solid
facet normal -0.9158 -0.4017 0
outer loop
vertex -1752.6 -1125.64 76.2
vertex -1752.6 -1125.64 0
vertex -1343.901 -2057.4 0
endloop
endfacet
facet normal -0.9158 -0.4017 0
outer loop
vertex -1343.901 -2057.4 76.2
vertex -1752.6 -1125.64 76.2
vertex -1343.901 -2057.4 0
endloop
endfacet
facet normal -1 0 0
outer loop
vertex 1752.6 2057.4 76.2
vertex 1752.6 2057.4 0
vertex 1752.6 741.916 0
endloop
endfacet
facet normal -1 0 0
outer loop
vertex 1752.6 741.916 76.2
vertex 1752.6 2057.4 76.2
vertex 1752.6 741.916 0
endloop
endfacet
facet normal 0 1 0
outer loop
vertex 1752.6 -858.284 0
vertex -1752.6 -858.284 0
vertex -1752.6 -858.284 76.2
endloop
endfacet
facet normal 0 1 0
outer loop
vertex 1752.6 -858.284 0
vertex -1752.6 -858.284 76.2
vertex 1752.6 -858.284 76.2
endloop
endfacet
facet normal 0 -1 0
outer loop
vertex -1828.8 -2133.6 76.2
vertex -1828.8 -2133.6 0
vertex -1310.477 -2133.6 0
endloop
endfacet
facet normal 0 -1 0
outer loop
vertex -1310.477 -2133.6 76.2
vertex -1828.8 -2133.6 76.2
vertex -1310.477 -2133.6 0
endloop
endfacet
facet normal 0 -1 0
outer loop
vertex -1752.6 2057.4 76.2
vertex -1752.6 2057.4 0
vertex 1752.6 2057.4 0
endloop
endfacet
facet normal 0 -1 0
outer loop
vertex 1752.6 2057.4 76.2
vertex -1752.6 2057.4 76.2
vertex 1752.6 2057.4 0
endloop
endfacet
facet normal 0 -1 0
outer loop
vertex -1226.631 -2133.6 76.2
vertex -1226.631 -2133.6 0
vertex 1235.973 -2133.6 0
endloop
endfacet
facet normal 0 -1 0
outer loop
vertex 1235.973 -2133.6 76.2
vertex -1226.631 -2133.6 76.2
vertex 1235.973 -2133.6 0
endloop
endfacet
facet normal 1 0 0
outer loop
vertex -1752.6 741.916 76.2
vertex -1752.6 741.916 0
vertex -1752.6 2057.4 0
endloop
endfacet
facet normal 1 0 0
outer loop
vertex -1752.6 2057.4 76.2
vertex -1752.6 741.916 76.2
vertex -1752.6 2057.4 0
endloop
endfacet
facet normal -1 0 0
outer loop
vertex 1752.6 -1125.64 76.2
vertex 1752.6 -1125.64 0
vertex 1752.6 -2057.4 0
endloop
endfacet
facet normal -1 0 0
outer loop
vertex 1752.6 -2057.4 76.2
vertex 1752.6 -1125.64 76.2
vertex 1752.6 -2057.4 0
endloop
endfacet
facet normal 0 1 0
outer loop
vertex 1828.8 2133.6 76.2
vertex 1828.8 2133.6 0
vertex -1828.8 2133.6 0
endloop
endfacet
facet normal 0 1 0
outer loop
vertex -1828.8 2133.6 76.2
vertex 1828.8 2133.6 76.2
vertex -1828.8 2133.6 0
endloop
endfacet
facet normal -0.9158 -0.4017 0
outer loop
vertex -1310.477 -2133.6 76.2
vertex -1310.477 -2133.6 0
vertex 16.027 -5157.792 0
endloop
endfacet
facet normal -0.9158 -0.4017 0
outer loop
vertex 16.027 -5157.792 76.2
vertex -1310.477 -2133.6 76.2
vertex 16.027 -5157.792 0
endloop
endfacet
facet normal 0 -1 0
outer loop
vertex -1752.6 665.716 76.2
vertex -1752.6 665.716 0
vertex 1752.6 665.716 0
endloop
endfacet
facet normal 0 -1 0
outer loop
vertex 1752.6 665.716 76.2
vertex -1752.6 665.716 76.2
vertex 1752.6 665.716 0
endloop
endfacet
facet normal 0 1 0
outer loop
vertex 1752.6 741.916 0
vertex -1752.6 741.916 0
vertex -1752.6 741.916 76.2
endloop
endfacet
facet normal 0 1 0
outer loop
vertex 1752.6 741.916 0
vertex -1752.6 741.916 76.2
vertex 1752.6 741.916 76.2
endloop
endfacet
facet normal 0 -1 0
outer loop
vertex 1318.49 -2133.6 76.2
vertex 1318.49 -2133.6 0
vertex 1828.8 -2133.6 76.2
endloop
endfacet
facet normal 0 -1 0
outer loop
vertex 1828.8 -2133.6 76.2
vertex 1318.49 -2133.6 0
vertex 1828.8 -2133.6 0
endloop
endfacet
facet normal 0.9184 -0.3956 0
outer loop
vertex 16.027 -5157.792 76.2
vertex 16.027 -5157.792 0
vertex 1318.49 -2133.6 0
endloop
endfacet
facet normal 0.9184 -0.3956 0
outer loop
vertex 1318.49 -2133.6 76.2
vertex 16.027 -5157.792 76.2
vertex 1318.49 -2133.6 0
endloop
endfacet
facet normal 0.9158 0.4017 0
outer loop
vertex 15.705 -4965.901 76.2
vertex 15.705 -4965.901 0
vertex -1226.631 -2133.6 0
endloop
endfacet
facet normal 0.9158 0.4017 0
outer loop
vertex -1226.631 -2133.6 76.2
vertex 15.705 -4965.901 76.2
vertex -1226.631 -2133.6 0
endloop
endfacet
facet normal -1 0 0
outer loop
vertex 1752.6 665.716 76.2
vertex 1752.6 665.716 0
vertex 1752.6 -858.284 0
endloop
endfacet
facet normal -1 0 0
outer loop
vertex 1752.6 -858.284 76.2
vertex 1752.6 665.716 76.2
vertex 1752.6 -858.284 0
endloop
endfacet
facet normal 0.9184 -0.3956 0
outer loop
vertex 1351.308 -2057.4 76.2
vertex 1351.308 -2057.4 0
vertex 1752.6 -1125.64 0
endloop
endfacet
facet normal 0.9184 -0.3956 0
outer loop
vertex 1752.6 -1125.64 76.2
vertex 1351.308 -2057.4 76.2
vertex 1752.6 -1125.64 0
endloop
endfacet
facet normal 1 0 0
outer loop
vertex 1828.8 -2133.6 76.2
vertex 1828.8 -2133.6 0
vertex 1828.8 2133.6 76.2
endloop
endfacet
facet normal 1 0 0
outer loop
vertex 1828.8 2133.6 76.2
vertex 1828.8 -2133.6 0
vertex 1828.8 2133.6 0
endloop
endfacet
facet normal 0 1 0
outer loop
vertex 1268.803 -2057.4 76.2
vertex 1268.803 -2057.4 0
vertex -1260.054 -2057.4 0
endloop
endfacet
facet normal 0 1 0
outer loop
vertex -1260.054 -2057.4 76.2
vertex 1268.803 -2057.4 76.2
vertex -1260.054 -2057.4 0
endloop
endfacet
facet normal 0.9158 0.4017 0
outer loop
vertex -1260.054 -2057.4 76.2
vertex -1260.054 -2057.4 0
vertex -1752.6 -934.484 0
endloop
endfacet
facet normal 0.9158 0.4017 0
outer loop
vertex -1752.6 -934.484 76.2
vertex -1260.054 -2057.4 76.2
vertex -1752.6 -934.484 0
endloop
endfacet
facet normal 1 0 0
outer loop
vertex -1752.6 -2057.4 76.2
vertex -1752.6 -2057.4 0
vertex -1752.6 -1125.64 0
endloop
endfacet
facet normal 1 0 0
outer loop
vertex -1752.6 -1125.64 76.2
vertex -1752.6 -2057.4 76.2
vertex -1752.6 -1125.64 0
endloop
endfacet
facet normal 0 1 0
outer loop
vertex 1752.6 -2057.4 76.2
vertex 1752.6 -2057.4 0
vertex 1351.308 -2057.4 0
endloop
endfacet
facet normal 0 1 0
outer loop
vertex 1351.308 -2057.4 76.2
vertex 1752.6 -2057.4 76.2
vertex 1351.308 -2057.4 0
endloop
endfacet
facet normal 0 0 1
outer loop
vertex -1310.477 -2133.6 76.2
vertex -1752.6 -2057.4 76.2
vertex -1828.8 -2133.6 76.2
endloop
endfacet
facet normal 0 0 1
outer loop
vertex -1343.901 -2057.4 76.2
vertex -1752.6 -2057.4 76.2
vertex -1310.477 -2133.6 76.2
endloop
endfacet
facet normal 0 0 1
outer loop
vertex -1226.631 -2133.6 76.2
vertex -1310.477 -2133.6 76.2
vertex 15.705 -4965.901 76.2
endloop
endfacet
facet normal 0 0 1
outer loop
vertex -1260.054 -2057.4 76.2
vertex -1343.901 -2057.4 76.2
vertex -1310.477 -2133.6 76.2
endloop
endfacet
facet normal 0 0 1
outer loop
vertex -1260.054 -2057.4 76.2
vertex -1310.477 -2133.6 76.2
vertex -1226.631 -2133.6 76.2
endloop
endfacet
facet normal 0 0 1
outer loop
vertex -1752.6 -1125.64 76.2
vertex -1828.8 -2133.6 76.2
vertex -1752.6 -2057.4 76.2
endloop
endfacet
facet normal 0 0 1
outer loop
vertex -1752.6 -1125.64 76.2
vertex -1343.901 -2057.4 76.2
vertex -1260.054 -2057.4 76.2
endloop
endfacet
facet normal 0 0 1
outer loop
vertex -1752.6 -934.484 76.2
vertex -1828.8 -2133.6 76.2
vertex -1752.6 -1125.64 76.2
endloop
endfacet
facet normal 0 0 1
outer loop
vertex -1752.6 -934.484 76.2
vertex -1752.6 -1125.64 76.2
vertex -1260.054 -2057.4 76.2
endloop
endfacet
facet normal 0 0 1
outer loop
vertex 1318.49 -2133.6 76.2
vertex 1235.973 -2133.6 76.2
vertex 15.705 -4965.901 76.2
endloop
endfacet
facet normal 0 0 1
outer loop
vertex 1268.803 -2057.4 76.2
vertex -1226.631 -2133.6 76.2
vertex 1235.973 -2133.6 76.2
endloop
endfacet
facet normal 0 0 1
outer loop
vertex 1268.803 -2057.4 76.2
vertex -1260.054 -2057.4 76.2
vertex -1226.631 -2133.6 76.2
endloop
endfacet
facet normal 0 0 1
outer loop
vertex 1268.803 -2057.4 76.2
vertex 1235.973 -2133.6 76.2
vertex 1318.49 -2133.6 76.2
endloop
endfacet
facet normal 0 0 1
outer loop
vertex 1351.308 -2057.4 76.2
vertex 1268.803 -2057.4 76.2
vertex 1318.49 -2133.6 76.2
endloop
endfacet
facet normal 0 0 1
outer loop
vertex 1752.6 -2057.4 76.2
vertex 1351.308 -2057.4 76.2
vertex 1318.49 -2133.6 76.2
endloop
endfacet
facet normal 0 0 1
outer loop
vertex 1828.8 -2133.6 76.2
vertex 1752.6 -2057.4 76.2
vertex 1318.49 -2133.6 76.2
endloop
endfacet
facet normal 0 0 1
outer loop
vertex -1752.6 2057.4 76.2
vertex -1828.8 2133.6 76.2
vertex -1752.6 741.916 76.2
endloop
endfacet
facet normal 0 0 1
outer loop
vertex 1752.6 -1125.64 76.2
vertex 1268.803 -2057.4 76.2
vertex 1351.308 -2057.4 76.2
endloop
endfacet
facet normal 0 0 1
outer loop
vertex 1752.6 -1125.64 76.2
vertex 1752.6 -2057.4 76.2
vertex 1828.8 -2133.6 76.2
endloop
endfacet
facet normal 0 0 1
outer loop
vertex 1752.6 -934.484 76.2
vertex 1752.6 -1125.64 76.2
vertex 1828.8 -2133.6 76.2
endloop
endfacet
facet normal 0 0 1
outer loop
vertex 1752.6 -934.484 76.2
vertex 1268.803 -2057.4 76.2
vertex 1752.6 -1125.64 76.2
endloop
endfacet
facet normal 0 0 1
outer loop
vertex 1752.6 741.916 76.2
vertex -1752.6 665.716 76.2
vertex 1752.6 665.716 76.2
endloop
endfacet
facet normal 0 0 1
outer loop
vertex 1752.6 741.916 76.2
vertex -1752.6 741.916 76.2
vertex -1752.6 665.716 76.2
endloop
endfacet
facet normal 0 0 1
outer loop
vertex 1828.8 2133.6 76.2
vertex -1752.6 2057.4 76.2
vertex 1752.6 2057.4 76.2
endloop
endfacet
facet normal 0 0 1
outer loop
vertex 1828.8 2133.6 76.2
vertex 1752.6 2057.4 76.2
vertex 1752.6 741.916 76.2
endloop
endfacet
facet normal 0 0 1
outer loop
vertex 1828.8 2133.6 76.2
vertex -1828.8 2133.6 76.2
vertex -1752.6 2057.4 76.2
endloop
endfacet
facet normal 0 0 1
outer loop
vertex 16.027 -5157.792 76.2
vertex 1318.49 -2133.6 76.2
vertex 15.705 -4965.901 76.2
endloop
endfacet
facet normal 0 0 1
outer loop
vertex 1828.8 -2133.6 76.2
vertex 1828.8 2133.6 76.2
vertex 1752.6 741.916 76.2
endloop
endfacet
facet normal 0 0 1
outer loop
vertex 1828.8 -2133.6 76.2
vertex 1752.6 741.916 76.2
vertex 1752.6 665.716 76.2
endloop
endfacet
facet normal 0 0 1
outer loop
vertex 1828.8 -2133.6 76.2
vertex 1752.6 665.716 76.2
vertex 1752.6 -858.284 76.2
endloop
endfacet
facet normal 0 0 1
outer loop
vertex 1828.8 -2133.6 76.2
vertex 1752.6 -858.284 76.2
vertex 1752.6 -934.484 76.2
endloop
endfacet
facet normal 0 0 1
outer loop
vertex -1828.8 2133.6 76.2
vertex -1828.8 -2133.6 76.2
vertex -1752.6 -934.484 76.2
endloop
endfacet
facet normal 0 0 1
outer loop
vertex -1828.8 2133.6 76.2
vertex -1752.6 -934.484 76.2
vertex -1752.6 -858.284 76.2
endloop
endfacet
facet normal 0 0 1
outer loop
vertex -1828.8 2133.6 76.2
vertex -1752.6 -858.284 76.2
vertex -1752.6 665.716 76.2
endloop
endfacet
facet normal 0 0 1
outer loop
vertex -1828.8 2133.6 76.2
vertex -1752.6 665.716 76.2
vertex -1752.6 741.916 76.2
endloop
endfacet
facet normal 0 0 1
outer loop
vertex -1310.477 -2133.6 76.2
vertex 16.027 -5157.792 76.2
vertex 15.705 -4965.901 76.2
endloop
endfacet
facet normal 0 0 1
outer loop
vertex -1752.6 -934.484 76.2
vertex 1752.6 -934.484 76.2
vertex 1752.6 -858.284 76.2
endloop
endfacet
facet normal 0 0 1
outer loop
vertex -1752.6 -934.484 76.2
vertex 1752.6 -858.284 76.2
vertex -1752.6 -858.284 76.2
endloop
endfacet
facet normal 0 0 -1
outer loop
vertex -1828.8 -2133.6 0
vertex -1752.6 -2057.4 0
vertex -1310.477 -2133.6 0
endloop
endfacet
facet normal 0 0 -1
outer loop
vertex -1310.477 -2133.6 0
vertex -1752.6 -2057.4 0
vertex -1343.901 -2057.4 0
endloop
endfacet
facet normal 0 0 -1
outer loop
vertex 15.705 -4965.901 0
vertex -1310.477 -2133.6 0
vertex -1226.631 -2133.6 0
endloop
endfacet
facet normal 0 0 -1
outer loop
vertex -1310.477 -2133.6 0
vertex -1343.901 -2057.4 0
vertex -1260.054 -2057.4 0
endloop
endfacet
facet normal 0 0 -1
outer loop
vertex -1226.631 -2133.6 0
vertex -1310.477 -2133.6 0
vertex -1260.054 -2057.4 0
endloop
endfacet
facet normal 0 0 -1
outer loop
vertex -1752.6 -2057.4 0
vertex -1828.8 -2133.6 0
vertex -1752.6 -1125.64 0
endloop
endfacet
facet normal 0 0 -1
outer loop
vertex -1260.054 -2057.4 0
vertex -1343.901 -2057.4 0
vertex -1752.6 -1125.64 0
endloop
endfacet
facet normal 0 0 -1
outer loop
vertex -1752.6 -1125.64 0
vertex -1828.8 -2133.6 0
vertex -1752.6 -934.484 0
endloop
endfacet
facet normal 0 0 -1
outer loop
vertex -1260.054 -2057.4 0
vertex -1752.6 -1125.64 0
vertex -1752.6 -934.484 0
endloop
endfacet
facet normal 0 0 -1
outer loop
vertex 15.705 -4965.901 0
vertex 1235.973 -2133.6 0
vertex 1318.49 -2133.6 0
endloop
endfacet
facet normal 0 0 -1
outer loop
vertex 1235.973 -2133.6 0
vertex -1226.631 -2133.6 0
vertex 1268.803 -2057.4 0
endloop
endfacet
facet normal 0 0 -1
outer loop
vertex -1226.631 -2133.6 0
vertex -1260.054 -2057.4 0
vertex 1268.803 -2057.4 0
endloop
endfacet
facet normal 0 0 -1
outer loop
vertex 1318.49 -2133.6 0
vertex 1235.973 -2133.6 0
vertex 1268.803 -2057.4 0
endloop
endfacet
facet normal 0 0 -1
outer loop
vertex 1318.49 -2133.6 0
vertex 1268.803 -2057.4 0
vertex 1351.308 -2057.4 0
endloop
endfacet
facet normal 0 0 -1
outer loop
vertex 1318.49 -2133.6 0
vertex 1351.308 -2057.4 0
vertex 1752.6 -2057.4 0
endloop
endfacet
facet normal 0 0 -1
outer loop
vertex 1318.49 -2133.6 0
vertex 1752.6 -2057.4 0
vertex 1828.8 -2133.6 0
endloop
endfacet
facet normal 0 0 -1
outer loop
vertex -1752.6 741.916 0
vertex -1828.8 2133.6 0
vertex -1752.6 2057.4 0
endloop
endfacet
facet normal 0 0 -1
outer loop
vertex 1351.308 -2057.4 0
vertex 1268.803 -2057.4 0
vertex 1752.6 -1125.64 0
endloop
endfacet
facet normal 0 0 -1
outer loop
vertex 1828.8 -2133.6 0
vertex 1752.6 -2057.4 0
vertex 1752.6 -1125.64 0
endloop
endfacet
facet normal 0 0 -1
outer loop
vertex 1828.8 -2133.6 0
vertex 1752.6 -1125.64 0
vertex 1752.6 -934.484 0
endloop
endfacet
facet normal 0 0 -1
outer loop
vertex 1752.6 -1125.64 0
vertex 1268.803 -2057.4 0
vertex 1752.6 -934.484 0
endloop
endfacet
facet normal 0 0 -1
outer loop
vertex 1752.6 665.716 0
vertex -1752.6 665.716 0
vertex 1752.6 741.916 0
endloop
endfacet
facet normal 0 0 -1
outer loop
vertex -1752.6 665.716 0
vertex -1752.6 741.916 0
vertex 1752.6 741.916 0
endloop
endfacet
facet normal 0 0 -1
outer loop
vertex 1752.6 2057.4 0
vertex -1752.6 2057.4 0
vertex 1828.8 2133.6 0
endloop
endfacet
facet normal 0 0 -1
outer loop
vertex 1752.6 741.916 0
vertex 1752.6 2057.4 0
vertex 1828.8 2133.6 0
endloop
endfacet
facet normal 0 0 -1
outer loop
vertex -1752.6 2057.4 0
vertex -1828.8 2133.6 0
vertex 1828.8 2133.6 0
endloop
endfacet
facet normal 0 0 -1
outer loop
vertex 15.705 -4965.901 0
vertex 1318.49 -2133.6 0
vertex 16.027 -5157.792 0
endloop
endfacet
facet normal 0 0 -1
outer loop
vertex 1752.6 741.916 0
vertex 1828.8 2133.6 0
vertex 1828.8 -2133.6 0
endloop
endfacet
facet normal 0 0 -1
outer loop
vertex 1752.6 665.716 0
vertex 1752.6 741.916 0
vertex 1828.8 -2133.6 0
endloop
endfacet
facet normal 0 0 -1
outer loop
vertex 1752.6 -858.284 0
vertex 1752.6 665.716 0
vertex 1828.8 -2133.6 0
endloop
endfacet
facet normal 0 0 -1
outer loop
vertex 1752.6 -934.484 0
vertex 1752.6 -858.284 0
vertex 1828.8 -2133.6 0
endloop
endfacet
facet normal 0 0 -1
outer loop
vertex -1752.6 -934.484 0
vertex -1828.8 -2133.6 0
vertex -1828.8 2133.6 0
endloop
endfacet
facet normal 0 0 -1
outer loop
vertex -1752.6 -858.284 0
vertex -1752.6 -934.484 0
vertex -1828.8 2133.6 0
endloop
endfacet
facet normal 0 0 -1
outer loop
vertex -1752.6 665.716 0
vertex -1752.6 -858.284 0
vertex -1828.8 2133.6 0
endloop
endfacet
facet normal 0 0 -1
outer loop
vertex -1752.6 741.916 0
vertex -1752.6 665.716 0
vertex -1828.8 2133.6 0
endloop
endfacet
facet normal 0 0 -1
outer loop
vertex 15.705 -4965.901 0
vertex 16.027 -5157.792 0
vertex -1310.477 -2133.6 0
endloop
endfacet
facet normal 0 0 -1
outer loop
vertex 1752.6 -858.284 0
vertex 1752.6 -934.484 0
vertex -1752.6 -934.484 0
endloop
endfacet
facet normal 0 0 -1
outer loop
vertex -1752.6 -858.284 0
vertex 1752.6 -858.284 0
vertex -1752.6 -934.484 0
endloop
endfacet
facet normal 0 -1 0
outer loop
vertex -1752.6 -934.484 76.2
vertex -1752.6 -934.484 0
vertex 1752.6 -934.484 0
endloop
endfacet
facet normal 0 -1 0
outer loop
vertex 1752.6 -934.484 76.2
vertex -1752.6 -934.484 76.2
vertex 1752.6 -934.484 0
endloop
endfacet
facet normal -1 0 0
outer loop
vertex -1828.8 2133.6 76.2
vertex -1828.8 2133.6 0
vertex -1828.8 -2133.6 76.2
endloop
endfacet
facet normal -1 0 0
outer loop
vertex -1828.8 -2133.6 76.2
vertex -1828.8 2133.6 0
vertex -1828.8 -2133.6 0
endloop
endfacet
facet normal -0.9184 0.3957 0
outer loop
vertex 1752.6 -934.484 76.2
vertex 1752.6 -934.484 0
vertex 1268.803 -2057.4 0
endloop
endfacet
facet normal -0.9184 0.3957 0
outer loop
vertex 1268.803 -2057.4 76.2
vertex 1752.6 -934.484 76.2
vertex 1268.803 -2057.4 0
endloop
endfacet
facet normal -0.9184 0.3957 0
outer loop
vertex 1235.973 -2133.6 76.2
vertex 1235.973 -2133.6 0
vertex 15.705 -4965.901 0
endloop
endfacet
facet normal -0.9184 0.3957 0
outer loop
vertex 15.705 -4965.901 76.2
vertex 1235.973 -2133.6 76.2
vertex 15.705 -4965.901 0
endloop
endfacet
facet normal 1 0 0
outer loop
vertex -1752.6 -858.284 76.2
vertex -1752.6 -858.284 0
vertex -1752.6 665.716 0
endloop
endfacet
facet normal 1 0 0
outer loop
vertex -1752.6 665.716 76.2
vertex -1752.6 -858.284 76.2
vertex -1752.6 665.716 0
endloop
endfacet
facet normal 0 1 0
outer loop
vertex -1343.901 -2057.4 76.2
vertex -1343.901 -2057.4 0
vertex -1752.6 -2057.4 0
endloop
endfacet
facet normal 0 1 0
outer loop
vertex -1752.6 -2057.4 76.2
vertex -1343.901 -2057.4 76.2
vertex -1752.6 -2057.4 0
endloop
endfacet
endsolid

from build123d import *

# Parameters (mm, degrees)
F1_DEPTH = 76.2
F0_W     = 3505.2
F0_H     = 76.2
F2_DEPTH = 76.2
F3_DEPTH = 76.2


with BuildPart() as f1:
    # F0 (on Top) → F1 (new body)
    with BuildSketch(Plane.XY):
        Polygon((1828.8, -2133.6), (1828.8, 2133.6), (-1828.8, 2133.6), (-1828.8, -2133.6), (-1310.4772827011, -2133.6), (-1343.9009678839, -2057.4), (-1752.6, -2057.4), (-1752.6, -1125.6396008411), (-1752.6, -934.4842076221), (-1752.6, -858.2842076221), (-1752.6, 665.7157923779), (-1752.6, 741.9157923779), (-1752.6, 2057.4), (1752.6, 2057.4), (1752.6, 741.9157923779), (1752.6, 665.7157923779), (1752.6, -858.2842076221), (1752.6, -934.4842076221), (1752.6, -1125.6396008411), (1752.6, -2057.4), (1351.3082711616, -2057.4), (1318.4903602855, -2133.6), align=None)
    extrude(amount=F1_DEPTH)

    # F0 (on Top) → F2 (join)
    with BuildSketch(Plane.XY):
        Polygon((16.0273923486, -5157.7924457489), (1318.4903602855, -2133.6), (1235.9730884481, -2133.6), (15.7046937593, -4965.9013576965), (-1226.6305939355, -2133.6), (-1310.4772827011, -2133.6), align=None)
        Polygon((-1343.9009678839, -2057.4), (-1310.4772827011, -2133.6), (-1226.6305939355, -2133.6), (-1260.0542791183, -2057.4), align=None)
        Polygon((-1752.6, -1125.6396008411), (-1343.9009678839, -2057.4), (-1260.0542791183, -2057.4), (-1752.6, -934.4842076221), align=None)
        Polygon((-1226.6305939355, -2133.6), (1235.9730884481, -2133.6), (1268.803087778, -2057.4), (-1260.0542791183, -2057.4), align=None)
        Polygon((1235.9730884481, -2133.6), (1318.4903602855, -2133.6), (1351.3082711616, -2057.4), (1268.803087778, -2057.4), align=None)
        Polygon((1268.803087778, -2057.4), (1351.3082711616, -2057.4), (1752.6, -1125.6396008411), (1752.6, -934.4842076221), align=None)
        with Locations((0, -896.3842076221)):
            Rectangle(F0_W, F0_H)
    extrude(amount=F2_DEPTH)

    # F0 (on Top) → F3 (join)
    with BuildSketch(Plane.XY):
        with Locations((0, 703.8157923779)):
            Rectangle(F0_W, F0_H)
    extrude(amount=F3_DEPTH)


solid = f1.part
